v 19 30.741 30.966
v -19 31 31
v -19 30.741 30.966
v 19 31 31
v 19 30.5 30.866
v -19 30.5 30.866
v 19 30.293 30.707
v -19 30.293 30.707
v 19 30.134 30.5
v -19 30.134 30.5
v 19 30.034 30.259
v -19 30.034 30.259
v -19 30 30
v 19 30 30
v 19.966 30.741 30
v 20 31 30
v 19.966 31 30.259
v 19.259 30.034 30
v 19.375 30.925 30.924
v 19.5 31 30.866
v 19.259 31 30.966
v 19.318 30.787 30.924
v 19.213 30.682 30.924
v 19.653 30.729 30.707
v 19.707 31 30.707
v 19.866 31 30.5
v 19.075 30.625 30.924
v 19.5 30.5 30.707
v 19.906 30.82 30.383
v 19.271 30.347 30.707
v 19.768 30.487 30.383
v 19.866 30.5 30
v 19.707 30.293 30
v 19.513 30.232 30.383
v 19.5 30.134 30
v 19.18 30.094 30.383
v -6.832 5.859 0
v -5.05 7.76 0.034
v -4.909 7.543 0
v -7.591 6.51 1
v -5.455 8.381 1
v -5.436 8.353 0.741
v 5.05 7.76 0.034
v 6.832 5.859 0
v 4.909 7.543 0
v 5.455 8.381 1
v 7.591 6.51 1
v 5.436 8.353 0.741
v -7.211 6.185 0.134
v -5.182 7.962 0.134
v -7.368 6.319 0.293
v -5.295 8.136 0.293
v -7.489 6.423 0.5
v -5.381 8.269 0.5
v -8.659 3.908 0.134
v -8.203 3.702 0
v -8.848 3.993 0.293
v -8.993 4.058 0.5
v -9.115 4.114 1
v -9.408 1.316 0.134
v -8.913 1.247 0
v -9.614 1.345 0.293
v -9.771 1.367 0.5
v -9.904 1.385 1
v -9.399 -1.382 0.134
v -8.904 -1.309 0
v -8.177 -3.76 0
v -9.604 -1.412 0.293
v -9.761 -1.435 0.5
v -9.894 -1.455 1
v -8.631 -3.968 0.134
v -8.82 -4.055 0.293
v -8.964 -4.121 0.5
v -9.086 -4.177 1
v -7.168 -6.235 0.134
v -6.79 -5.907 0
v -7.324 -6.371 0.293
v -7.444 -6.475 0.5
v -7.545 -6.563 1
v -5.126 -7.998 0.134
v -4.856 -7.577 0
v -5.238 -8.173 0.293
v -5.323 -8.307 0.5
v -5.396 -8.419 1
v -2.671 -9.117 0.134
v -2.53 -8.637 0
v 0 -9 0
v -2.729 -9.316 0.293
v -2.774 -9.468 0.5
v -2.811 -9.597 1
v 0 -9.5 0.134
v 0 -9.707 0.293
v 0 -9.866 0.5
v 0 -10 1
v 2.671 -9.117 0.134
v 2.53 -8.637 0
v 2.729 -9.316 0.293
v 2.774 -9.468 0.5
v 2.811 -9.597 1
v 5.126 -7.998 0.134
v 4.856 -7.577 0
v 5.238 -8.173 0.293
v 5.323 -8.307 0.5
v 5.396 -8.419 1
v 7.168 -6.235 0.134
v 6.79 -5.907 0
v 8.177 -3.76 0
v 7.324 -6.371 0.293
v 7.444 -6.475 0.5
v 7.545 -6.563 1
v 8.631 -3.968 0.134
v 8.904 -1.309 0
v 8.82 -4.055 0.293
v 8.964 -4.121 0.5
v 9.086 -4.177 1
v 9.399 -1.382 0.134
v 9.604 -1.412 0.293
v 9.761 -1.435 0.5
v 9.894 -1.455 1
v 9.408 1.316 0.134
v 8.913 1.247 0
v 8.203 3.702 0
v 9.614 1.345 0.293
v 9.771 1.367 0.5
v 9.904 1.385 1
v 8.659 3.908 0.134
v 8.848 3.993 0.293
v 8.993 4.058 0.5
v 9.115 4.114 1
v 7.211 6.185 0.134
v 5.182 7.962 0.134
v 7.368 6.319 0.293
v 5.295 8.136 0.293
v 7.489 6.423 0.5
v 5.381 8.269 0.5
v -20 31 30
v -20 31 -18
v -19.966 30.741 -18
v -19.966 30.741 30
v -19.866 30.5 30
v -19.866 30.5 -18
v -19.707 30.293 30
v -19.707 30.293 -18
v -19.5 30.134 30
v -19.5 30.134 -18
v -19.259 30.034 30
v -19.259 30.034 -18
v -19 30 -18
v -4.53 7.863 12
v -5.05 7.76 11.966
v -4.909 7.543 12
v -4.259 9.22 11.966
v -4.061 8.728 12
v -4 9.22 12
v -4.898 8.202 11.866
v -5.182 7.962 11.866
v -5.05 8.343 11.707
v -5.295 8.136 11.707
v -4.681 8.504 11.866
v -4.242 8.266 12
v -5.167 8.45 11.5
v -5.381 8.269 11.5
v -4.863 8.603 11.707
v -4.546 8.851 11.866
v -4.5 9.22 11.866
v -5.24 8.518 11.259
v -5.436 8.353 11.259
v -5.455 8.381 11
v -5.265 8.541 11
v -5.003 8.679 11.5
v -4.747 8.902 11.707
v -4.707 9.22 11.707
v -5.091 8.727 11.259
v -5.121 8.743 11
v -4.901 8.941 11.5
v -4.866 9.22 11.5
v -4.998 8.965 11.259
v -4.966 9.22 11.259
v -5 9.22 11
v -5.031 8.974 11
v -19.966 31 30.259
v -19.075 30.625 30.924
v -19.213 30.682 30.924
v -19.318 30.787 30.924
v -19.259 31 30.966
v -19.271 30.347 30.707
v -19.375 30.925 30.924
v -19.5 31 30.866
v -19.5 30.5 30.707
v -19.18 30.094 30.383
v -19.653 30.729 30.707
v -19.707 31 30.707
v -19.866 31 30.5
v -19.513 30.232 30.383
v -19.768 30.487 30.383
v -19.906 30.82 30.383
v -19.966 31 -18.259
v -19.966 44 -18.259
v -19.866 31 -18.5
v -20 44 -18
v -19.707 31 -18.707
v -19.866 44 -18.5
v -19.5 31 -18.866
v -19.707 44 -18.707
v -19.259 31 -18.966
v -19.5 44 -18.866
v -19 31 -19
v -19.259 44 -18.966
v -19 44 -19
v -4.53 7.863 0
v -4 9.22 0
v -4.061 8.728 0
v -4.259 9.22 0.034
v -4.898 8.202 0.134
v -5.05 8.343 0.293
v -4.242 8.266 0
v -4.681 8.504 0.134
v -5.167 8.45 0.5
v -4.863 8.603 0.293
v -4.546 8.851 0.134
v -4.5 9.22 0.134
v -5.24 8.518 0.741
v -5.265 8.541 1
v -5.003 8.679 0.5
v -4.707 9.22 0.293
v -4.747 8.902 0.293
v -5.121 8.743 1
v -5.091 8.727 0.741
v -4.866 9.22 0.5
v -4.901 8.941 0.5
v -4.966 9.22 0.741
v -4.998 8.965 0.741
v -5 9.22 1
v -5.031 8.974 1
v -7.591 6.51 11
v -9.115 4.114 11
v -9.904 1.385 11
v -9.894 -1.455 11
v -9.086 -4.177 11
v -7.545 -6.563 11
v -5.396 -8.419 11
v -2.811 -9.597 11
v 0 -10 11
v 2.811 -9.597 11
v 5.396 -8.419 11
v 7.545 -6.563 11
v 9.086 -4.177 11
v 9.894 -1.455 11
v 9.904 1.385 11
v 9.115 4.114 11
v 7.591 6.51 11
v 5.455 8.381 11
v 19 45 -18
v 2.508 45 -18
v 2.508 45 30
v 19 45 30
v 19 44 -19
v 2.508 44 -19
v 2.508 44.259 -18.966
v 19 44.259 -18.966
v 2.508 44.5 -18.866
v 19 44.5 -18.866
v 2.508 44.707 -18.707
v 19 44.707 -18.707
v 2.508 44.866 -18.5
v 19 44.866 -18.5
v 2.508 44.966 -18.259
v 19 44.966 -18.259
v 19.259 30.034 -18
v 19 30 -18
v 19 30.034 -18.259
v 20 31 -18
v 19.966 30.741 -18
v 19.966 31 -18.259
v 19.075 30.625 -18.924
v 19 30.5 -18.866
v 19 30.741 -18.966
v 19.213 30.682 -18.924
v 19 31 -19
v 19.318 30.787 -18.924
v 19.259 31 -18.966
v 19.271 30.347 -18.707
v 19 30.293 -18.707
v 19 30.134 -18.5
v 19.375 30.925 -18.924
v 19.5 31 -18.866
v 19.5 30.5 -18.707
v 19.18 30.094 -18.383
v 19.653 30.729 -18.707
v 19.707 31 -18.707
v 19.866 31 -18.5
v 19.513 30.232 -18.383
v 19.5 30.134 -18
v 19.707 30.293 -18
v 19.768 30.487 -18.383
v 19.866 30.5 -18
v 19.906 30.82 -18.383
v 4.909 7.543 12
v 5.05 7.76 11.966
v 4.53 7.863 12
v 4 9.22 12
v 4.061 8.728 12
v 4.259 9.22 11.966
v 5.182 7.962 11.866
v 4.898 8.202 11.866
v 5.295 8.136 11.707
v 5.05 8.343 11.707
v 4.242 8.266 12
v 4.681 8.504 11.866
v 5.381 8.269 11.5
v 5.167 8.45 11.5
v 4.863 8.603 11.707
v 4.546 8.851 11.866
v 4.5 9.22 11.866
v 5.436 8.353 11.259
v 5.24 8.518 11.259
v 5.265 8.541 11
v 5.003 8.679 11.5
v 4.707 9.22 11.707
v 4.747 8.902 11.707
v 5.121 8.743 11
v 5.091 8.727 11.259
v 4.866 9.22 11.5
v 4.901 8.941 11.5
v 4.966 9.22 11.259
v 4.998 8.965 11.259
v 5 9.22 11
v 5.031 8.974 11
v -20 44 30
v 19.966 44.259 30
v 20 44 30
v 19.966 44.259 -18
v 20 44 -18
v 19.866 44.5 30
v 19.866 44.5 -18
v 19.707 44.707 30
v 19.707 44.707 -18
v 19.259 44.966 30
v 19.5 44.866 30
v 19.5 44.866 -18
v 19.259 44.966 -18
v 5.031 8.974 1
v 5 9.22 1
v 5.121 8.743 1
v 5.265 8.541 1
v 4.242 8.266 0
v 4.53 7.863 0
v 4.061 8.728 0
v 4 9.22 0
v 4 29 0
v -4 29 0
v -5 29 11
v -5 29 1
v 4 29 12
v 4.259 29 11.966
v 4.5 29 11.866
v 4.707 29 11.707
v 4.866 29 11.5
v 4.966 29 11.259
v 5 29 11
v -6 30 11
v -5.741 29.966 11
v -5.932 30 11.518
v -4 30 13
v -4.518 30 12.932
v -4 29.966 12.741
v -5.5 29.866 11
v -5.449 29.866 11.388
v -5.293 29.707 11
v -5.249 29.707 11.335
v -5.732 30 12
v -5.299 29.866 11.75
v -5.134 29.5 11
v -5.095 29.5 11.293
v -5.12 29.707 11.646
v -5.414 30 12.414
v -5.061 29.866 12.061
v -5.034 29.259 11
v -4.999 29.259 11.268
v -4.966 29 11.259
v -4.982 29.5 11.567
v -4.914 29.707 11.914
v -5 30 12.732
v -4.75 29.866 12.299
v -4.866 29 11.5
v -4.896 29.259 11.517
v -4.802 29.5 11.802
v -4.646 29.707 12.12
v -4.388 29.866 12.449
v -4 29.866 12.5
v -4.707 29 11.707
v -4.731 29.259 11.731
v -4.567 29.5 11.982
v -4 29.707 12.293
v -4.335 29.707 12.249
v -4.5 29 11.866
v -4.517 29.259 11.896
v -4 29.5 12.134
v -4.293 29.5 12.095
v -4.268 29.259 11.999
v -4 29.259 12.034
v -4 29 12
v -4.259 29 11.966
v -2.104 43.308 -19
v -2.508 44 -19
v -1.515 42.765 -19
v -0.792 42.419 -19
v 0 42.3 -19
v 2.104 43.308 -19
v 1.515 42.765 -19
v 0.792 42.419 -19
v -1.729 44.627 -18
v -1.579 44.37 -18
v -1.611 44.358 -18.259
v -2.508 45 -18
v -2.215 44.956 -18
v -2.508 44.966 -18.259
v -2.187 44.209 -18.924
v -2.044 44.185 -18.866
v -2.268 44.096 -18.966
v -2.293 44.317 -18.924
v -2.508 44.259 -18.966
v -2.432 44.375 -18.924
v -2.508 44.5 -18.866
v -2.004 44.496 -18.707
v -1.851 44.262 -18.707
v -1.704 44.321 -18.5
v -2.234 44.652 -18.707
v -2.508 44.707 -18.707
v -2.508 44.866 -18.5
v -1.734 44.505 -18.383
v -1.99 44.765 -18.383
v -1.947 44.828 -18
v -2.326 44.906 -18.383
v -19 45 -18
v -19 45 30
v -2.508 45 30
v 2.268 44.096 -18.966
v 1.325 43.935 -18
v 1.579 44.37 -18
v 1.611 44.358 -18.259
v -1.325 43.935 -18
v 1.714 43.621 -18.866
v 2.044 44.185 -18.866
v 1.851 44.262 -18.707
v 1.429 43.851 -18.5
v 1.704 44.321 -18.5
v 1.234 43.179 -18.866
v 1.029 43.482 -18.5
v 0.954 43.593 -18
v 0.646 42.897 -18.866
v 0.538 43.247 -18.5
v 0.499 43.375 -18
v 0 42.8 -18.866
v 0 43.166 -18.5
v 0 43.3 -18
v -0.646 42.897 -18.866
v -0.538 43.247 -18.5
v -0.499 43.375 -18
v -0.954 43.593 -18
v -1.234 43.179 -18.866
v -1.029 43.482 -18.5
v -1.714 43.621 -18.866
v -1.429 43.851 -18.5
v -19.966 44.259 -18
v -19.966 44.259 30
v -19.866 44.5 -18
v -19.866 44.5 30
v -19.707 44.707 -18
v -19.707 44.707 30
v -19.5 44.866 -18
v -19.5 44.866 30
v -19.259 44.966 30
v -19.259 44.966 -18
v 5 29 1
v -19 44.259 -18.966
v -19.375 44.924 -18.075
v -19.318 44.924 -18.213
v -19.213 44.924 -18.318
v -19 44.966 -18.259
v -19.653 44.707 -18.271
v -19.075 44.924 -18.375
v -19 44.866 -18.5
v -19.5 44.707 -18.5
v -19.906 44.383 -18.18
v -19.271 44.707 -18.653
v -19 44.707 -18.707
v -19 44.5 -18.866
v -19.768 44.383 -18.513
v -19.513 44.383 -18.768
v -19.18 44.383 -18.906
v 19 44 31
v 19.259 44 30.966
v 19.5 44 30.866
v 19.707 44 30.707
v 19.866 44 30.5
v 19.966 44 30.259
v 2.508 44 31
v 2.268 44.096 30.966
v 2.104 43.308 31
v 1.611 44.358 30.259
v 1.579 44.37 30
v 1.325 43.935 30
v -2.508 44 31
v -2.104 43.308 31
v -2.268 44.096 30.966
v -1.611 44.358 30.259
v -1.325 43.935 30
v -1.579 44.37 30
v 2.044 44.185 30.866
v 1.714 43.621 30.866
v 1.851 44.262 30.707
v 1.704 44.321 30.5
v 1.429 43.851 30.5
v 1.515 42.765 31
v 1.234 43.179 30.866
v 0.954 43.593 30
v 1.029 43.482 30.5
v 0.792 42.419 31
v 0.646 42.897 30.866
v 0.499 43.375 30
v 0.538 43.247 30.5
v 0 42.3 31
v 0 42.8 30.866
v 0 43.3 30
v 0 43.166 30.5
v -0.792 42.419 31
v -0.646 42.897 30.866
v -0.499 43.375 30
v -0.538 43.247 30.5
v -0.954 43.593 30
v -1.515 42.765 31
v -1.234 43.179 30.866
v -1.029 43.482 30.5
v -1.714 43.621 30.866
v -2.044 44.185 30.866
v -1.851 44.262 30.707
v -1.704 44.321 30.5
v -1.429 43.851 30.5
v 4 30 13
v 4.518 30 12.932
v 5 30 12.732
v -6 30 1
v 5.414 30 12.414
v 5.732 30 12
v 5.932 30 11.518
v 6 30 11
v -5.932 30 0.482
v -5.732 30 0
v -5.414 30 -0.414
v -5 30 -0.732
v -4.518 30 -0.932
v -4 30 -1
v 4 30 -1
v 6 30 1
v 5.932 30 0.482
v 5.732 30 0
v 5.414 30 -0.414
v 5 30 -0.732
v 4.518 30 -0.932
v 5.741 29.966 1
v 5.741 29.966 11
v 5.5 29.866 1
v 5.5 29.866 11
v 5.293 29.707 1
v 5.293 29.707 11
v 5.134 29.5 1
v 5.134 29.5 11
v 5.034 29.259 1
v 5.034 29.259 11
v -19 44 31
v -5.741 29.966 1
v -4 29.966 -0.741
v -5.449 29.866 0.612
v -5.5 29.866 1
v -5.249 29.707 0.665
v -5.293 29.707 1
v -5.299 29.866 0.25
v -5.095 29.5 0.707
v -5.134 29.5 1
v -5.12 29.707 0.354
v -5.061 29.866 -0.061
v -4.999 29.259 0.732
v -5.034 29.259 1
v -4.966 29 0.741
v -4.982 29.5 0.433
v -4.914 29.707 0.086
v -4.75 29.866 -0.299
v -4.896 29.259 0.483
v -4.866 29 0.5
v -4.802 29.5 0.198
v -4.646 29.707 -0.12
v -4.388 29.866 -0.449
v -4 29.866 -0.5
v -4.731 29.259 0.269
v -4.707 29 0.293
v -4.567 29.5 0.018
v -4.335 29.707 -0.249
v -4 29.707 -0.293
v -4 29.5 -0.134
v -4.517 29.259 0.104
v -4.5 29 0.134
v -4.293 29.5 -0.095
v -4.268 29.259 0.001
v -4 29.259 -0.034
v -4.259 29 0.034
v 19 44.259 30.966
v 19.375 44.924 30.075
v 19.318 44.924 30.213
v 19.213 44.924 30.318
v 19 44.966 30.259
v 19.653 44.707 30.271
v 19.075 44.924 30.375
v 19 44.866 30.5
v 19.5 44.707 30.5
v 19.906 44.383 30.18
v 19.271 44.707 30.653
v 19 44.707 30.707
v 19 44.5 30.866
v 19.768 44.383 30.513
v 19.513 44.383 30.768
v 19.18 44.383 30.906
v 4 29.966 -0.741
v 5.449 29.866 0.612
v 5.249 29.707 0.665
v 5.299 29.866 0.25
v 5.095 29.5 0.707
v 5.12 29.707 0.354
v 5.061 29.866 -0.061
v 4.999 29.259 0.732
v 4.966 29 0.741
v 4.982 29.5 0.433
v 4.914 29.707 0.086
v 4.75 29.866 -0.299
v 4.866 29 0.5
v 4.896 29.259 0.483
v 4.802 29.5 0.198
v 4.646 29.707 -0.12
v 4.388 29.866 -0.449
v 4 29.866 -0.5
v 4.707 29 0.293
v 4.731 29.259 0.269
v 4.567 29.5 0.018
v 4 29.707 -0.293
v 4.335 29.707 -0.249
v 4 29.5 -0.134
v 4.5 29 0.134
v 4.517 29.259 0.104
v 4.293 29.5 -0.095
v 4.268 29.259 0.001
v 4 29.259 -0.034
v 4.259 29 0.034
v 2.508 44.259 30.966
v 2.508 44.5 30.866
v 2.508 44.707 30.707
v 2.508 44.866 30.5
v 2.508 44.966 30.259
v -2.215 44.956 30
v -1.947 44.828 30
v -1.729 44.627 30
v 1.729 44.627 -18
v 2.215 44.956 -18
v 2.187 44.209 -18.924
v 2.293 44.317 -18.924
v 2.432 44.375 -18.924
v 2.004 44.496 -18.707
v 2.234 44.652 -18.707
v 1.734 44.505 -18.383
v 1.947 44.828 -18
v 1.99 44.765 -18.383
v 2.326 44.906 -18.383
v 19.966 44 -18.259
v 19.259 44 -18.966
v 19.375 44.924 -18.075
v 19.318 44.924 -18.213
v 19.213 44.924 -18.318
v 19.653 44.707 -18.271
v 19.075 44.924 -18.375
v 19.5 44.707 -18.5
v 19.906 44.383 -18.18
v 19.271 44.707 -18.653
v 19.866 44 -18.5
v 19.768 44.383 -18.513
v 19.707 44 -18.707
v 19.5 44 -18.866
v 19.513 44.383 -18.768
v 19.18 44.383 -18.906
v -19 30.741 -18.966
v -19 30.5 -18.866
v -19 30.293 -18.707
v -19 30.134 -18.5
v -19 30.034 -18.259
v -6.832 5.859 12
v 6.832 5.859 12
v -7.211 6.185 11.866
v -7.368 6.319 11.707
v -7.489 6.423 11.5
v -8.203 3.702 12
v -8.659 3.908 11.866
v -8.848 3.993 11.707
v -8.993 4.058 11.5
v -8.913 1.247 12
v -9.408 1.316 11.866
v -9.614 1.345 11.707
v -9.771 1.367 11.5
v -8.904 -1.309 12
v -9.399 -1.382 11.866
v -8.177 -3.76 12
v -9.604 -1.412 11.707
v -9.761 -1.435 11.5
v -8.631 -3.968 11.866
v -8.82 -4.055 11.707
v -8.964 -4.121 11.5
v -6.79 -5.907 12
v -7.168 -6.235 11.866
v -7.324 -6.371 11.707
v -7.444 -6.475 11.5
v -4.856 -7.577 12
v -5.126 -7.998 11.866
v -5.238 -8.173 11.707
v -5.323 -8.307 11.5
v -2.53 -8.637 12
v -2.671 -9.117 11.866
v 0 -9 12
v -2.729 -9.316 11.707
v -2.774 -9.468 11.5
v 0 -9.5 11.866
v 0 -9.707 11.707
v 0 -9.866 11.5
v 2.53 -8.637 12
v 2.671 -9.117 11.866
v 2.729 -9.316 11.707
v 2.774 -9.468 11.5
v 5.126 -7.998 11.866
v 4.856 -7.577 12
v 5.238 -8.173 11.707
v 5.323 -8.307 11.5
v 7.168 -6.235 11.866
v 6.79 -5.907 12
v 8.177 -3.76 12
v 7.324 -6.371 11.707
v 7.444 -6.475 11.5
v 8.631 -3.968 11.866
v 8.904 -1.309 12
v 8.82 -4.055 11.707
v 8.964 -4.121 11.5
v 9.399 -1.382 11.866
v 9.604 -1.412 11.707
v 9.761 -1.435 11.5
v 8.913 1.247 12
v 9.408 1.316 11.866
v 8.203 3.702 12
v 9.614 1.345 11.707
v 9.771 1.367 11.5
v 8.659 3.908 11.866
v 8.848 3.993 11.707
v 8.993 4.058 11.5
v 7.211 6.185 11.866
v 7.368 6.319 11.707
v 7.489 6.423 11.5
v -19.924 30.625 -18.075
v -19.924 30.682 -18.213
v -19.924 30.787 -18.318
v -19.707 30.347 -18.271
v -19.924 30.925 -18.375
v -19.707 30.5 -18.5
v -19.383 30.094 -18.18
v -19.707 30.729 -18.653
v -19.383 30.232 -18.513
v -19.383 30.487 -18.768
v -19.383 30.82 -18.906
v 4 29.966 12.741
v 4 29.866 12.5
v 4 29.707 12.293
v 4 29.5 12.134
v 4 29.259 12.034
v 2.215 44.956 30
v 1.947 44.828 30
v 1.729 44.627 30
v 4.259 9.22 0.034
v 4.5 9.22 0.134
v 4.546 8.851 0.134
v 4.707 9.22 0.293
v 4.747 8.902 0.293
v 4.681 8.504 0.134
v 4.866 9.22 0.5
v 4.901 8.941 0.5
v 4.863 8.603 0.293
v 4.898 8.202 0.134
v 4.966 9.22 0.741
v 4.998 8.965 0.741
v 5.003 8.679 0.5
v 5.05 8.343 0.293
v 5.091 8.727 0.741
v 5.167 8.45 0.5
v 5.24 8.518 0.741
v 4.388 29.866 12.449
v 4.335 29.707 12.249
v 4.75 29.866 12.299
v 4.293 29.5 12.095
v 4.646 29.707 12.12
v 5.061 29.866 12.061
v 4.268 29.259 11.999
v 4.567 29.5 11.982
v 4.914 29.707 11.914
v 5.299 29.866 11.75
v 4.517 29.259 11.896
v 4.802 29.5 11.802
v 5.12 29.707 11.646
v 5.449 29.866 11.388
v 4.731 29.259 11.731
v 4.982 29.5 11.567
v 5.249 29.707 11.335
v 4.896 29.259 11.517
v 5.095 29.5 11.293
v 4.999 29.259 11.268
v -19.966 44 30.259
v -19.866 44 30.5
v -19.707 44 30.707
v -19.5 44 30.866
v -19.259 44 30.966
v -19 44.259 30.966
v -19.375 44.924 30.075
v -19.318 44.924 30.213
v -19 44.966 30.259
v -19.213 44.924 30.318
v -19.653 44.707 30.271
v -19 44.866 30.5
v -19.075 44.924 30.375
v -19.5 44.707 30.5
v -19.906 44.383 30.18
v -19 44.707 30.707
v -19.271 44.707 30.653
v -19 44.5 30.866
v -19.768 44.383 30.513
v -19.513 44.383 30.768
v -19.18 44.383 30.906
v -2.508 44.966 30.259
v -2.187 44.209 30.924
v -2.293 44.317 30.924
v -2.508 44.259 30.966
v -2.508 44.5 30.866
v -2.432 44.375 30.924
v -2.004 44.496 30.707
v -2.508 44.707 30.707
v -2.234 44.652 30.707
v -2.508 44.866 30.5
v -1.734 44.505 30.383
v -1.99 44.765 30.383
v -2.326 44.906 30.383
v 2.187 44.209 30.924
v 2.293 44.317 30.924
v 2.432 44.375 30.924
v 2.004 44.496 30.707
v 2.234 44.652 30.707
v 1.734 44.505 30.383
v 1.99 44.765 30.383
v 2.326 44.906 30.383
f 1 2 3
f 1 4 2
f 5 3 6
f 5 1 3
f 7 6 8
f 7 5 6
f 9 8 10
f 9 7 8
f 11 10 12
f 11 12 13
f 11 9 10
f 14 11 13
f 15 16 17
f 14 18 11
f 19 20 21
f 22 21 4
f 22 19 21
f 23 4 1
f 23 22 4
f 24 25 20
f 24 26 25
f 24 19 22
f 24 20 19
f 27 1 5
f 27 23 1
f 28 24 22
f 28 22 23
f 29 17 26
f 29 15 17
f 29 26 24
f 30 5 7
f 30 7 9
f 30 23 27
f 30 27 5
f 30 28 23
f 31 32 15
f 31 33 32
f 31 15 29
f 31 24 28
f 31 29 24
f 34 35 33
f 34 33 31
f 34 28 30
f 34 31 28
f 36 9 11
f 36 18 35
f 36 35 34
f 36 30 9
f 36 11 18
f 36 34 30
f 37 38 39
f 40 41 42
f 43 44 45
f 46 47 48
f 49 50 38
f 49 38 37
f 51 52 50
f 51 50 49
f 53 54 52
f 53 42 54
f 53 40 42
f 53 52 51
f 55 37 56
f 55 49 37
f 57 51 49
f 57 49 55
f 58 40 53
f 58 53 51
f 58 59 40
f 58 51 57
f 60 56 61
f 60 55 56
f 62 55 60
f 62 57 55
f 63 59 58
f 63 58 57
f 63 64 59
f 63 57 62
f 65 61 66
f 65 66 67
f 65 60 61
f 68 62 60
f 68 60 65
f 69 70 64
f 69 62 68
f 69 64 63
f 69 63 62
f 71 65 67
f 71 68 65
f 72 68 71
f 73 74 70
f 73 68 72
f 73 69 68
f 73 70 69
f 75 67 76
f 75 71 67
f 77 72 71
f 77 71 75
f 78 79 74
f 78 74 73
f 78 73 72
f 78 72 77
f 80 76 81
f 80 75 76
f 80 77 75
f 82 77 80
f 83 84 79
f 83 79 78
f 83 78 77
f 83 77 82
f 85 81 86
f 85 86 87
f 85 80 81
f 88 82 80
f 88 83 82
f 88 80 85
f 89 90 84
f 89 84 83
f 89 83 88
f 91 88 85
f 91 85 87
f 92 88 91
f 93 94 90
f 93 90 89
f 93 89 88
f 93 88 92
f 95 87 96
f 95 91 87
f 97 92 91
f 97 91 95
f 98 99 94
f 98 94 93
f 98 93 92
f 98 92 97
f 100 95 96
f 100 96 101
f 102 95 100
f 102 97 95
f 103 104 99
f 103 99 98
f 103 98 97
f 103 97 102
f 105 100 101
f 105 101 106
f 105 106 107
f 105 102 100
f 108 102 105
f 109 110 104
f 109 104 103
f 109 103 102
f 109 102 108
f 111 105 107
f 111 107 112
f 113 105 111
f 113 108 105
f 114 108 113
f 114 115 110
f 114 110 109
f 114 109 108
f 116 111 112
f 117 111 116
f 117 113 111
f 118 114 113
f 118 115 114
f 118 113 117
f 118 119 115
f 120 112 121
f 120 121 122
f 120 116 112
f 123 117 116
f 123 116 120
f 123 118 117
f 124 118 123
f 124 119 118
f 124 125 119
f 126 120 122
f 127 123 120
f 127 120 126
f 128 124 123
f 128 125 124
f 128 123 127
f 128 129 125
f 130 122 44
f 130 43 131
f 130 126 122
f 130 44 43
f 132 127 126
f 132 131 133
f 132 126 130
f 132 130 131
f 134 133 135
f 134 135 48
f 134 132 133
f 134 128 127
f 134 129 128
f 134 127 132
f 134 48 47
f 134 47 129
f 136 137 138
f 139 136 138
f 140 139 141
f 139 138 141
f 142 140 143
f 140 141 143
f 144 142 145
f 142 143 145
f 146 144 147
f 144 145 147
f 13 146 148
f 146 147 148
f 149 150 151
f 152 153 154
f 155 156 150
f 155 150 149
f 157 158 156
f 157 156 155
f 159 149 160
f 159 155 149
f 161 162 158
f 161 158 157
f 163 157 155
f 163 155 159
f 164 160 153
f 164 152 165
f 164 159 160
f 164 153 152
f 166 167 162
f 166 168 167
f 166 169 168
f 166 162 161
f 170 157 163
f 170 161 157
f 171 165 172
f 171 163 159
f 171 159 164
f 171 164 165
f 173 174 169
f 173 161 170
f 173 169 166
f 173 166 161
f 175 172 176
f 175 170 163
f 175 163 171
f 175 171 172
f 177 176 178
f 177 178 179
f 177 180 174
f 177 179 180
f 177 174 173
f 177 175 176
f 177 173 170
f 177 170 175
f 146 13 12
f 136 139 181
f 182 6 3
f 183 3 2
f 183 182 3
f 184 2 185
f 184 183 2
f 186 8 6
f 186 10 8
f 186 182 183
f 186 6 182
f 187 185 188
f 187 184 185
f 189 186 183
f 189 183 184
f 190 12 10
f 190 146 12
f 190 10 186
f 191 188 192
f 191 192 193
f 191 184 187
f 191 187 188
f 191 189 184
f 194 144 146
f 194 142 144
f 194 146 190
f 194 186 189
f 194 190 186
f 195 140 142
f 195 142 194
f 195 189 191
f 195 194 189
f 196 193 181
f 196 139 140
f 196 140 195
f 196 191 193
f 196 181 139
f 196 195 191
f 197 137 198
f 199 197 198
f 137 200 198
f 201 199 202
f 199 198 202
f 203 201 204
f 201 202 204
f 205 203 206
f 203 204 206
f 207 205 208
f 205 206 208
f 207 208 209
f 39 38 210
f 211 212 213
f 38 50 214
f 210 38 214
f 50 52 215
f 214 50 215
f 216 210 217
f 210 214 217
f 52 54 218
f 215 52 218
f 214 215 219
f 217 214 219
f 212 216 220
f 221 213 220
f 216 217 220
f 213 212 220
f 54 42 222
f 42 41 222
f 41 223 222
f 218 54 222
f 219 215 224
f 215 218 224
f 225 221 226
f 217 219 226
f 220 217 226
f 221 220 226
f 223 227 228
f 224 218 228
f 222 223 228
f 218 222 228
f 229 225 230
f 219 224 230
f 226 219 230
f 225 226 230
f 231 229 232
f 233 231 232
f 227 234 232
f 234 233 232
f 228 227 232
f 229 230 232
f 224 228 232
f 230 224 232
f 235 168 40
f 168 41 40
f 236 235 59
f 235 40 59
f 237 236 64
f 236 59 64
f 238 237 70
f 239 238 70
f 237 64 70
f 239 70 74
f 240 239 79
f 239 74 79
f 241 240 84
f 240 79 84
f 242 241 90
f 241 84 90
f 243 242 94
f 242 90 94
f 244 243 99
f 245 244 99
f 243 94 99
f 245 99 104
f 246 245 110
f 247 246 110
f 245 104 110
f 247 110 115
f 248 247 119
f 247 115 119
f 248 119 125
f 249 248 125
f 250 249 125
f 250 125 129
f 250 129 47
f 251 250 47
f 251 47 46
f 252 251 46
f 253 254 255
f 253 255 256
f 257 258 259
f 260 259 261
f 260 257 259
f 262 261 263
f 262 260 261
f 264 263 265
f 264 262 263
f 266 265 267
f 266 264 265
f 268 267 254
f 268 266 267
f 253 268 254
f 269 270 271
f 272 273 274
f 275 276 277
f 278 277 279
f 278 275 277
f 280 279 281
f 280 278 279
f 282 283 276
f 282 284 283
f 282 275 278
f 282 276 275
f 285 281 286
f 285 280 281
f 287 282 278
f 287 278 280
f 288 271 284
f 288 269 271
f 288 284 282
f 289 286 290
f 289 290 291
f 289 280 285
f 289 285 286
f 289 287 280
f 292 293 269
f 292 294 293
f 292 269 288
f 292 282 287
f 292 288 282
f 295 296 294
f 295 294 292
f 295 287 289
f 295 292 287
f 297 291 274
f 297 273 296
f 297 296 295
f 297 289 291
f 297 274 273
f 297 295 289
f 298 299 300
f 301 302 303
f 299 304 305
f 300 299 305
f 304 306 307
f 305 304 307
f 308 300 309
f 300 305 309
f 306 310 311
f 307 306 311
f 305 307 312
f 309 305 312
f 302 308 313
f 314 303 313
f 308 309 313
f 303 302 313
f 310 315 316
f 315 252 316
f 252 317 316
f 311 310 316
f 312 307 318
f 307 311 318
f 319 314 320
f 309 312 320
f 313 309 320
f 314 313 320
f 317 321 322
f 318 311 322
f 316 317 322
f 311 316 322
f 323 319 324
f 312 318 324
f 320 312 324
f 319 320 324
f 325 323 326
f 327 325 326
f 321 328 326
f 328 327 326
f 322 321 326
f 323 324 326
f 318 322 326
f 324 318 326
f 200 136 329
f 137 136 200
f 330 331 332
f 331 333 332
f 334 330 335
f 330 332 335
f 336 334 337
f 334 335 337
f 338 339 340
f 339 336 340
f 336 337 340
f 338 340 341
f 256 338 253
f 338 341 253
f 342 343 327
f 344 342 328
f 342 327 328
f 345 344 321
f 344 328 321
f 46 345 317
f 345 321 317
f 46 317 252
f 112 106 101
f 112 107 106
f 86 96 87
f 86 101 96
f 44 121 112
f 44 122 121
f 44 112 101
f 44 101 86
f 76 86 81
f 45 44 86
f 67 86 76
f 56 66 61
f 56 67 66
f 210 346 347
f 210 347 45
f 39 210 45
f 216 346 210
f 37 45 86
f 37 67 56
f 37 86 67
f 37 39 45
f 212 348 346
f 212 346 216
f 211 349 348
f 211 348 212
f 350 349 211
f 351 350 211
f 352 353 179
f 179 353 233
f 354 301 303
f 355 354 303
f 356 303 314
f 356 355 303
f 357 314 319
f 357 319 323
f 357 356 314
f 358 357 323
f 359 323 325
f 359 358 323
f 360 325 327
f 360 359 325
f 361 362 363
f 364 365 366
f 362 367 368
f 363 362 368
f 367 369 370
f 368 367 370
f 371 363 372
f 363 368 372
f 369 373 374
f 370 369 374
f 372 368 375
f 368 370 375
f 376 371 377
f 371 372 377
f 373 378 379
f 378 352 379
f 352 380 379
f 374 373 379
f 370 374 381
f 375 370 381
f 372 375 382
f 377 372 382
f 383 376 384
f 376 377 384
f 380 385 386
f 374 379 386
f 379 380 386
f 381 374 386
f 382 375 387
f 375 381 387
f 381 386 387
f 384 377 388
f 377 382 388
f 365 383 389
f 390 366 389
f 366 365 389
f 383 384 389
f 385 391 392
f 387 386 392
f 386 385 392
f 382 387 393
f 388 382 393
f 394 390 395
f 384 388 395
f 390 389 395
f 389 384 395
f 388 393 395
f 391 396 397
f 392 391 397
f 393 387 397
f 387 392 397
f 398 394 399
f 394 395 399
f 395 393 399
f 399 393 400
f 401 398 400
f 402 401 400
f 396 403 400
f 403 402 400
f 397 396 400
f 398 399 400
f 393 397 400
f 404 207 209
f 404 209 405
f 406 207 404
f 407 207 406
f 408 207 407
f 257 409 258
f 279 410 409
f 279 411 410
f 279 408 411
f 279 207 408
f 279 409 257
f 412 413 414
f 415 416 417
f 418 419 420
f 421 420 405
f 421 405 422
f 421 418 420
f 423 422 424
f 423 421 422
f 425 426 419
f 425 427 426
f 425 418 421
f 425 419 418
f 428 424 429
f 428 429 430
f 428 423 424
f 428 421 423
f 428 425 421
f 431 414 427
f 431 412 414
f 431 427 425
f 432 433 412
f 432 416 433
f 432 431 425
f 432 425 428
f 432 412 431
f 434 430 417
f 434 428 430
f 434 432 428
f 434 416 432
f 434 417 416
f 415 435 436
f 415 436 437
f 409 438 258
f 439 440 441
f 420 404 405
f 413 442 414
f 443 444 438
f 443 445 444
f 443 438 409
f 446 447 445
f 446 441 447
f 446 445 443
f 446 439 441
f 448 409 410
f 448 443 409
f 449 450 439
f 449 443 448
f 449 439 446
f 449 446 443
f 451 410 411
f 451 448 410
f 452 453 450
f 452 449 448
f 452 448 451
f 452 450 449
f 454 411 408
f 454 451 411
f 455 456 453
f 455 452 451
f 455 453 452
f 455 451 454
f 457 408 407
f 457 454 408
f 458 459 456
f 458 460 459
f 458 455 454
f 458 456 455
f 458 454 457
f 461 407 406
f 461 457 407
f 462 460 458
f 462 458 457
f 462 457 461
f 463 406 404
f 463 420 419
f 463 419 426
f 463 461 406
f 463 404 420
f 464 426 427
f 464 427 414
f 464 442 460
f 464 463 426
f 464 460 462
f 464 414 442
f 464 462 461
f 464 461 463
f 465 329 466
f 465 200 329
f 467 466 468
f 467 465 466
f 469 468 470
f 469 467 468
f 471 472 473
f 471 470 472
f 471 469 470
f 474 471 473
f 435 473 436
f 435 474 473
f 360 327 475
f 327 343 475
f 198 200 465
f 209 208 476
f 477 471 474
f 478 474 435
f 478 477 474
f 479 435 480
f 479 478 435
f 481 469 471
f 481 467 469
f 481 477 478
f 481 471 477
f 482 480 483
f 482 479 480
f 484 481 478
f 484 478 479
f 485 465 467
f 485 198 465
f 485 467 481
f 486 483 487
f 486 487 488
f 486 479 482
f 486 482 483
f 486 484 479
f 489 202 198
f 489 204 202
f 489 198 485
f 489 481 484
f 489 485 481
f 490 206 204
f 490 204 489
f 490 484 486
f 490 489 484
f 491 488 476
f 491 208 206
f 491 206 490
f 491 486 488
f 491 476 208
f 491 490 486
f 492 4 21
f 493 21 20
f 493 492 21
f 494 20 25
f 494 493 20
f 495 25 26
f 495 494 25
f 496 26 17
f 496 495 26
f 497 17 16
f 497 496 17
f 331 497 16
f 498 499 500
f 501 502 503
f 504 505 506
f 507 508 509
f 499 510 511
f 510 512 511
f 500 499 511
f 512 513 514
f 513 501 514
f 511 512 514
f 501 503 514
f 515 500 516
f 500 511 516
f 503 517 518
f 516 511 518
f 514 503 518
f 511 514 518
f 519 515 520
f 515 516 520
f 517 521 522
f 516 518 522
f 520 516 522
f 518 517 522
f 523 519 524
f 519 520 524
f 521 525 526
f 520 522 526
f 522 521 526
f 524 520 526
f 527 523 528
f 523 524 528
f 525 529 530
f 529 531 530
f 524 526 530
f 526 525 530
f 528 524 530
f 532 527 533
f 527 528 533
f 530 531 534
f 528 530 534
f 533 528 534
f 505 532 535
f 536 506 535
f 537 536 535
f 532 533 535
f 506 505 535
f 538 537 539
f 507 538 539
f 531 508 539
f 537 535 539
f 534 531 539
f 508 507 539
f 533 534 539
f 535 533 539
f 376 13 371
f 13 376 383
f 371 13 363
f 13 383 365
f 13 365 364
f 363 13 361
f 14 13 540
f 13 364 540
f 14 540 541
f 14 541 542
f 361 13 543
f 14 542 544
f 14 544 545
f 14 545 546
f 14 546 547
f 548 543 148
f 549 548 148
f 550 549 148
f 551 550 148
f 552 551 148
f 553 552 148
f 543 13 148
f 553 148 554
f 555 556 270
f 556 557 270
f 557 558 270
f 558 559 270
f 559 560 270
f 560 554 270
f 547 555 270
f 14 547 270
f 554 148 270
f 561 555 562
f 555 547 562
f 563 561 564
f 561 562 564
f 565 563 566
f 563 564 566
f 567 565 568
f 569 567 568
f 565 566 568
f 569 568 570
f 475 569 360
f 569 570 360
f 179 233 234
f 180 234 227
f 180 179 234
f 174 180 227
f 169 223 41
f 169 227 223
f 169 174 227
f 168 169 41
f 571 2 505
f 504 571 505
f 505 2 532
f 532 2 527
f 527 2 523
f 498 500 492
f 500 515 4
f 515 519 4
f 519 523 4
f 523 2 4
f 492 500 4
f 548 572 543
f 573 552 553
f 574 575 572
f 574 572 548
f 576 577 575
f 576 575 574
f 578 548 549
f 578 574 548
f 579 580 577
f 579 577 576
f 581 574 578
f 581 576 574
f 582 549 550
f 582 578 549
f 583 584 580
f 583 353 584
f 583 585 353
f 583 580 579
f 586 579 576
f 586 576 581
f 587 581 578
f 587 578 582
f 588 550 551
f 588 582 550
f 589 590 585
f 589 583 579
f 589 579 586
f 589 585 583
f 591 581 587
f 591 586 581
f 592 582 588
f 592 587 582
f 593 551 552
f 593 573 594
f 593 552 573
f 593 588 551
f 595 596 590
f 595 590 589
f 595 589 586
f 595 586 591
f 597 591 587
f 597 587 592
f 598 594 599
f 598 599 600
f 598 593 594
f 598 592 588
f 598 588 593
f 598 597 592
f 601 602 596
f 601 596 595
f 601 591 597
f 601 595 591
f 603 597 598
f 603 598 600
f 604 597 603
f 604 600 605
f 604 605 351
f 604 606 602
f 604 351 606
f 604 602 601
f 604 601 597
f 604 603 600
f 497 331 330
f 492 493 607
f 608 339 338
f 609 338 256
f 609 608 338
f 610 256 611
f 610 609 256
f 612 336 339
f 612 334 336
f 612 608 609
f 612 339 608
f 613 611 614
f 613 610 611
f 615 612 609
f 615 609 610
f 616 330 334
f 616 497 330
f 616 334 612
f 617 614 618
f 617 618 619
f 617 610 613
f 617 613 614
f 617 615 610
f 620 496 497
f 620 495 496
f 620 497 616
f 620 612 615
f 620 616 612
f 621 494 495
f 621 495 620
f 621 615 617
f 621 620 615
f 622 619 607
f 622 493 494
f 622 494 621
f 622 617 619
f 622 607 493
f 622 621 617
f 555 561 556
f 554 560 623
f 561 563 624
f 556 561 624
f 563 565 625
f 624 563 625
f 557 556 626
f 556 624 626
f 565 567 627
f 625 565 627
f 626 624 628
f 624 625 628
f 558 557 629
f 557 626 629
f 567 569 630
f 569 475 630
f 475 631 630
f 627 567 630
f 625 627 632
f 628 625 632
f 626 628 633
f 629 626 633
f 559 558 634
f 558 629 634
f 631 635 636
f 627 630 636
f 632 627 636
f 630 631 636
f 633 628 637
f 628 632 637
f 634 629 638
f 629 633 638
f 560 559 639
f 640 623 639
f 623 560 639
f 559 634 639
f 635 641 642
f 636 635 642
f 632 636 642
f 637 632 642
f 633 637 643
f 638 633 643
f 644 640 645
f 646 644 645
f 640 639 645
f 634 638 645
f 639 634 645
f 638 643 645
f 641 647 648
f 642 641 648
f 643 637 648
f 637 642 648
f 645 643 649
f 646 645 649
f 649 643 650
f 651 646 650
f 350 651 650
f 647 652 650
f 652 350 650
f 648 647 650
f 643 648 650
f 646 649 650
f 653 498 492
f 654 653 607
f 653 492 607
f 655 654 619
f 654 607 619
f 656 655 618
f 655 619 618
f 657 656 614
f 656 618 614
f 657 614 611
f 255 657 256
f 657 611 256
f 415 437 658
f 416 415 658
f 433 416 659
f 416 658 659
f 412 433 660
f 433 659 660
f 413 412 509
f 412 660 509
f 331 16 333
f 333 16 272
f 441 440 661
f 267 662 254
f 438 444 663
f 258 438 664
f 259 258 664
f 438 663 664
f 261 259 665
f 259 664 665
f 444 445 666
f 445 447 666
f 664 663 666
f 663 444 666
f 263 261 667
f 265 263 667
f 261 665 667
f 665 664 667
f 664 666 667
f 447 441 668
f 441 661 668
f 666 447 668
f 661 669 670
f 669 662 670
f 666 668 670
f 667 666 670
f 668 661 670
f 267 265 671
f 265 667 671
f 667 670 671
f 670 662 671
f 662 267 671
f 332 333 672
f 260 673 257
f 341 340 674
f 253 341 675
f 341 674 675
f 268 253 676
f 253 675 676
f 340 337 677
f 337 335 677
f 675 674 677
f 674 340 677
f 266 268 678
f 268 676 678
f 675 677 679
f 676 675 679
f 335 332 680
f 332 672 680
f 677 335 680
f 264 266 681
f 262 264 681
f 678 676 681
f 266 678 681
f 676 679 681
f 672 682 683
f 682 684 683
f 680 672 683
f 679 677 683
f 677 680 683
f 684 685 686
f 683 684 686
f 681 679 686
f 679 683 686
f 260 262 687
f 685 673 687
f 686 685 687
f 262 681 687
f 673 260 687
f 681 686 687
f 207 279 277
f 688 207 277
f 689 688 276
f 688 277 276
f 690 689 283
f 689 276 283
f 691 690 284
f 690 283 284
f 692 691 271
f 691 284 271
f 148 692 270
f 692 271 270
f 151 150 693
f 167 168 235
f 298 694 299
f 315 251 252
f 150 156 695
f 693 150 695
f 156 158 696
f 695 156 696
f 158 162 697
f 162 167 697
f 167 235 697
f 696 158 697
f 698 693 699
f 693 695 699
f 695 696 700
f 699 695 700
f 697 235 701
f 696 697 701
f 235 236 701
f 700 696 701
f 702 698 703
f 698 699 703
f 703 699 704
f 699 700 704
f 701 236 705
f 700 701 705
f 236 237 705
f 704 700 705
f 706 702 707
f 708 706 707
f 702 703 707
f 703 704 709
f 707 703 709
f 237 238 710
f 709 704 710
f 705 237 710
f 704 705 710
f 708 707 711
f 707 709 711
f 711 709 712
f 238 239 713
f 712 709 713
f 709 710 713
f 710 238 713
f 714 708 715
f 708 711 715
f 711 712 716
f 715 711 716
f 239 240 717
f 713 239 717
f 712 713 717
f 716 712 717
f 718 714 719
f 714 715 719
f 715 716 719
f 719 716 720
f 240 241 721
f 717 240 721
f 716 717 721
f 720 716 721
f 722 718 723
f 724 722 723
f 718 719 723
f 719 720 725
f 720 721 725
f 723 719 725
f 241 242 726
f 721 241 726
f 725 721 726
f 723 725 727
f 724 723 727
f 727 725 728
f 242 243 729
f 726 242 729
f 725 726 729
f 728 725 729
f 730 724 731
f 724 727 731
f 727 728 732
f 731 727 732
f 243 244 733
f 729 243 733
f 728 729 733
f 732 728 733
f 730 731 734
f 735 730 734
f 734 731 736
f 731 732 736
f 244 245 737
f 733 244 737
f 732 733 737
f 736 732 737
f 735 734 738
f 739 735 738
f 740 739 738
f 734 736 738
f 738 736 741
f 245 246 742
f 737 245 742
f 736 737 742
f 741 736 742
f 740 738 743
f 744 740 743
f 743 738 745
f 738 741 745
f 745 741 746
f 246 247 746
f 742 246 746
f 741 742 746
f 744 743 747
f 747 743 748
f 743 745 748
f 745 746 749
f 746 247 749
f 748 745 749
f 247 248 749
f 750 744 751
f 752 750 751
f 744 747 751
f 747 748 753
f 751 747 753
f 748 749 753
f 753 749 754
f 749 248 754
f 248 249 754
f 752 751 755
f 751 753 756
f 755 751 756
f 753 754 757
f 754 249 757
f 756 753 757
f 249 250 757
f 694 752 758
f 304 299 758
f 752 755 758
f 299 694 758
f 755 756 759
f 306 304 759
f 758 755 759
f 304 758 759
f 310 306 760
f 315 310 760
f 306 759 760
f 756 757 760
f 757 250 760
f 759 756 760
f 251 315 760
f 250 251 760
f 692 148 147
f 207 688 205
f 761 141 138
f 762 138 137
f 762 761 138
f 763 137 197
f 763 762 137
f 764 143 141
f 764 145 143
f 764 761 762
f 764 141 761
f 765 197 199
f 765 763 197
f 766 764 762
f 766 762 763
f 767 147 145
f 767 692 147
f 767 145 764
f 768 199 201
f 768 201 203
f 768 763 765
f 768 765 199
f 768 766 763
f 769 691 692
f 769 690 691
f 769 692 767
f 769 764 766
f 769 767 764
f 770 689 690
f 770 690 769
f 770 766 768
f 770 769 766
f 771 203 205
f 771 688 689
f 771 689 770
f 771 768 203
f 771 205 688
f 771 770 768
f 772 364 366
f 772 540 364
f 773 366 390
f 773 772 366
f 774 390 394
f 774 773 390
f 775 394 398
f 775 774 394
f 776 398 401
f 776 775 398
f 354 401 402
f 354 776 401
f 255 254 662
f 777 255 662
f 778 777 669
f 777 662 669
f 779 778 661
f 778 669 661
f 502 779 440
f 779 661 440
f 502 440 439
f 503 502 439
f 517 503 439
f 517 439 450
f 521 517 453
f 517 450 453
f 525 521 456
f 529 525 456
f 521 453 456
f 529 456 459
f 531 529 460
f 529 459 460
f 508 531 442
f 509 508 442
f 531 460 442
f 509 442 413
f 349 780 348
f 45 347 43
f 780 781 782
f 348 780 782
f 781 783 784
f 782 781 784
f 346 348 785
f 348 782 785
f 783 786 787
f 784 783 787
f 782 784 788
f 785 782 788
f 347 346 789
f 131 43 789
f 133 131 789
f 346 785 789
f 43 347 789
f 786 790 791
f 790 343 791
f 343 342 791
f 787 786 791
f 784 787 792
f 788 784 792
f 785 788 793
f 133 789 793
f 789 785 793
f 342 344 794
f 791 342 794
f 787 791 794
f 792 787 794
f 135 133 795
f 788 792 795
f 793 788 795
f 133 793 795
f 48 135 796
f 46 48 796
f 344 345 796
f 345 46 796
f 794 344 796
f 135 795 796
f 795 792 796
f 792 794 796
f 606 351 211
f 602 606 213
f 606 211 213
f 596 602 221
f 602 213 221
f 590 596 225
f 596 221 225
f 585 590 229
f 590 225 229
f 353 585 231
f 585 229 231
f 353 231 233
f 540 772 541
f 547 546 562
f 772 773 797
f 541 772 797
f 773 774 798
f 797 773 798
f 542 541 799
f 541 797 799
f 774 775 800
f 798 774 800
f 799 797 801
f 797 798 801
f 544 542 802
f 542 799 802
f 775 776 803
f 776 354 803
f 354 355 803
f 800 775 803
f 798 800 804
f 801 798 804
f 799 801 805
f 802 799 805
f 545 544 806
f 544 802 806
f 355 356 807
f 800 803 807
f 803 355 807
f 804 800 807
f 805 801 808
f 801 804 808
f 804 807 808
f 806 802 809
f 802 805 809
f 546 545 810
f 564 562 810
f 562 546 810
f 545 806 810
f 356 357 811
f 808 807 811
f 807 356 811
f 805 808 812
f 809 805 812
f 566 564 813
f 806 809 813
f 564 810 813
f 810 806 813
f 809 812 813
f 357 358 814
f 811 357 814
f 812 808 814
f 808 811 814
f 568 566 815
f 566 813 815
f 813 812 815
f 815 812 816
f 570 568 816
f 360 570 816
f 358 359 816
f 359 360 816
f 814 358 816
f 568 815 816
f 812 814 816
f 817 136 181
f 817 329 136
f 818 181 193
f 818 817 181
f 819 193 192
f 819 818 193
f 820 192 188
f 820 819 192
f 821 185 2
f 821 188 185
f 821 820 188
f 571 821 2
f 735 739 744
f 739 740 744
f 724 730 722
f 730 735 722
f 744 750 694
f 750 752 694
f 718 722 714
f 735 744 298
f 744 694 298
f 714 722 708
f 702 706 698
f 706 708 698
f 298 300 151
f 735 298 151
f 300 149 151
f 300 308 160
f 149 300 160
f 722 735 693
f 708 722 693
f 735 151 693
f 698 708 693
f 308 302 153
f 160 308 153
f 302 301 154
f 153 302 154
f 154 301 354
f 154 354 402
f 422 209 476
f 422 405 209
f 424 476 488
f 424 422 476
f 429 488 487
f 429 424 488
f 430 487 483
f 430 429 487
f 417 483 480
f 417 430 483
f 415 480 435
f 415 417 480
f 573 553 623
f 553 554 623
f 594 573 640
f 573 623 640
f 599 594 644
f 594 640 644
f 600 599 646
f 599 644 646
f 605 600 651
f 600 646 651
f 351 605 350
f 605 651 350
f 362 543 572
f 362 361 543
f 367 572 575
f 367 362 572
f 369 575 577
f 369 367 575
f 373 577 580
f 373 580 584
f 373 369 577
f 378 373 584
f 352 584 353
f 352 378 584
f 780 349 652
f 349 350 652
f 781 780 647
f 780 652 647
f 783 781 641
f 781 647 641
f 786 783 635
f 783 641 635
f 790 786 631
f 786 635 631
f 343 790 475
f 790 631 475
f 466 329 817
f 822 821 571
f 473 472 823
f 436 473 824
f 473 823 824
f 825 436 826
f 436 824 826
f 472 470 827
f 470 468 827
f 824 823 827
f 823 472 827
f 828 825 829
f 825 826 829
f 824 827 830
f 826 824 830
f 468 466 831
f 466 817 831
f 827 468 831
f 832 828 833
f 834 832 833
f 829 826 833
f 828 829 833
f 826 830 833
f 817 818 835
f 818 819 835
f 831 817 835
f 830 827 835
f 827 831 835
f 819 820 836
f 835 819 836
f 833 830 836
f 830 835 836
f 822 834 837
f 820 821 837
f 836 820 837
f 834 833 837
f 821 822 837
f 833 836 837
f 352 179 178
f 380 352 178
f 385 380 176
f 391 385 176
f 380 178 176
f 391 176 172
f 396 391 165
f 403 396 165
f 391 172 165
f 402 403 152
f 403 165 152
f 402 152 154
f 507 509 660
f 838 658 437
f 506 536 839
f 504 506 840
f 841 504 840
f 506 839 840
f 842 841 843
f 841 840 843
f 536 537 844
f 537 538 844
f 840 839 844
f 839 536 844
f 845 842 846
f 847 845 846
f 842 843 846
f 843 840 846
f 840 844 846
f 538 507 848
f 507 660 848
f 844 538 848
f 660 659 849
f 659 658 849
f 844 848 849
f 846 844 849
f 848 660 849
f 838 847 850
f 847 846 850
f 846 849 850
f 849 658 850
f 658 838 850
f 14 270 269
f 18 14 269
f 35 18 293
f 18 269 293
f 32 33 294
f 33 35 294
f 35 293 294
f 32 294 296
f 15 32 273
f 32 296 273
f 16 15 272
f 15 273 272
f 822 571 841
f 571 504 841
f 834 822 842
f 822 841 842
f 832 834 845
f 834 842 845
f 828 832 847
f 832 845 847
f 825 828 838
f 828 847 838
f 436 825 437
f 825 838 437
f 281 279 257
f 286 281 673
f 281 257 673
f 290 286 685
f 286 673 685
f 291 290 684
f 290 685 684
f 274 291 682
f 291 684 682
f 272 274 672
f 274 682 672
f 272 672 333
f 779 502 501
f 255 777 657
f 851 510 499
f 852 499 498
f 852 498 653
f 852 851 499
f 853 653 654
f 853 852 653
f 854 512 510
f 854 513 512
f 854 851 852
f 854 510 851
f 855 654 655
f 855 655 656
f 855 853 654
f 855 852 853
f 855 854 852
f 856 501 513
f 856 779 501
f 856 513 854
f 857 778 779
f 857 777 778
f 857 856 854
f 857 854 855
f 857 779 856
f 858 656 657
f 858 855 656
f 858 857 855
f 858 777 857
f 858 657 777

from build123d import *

# Parameters (mm, degrees)
EXTRUDE_1_DEPTH     = 12
SKETCH_2_W          = 40
SKETCH_2_H          = 50
EXTRUDE_2_DEPTH     = 15
SKETCH_3_R          = 1.7
CUT_EXTRUDE_2_DEPTH = 53
FILLET_1_R          = 1


with BuildPart() as part:
    # 草图1 → 凸台-拉伸1 (new body)
    with BuildSketch(Plane.XY):
        Polygon((5, 30), (5, 10), (5, 0), (0, 0), (-5, 0), (-5, 10), (-5, 30), align=None)
        with BuildLine():
            Line((-5, 0), (-5, 8.660254038))
            ThreePointArc((-5, 8.660254038), (0, -10), (5, 8.660254038))
            Line((5, 8.660254038), (5, 0))
            Line((5, 0), (0, 0))
            Line((0, 0), (-5, 0))
        make_face()
    extrude(amount=EXTRUDE_1_DEPTH)

    # 草图2 → 凸台-拉伸2 (add)
    with BuildSketch(Plane(origin=(0, 30, 0), x_dir=(1, 0, 0), z_dir=(0, 1, 0))):
        with Locations((0, -6)):
            Rectangle(SKETCH_2_W, SKETCH_2_H)
    extrude(amount=EXTRUDE_2_DEPTH)

    # 草图3 → 切除-拉伸2 (cut)
    with BuildSketch(Plane(origin=(0, 0, -19), x_dir=(-1, 0, 0), z_dir=(0, 0, -1))):
        with Locations((0, 45)):
            Circle(SKETCH_3_R)
    extrude(amount=-CUT_EXTRUDE_2_DEPTH, mode=Mode.SUBTRACT)

    # 圆角1
    fillet_1_edges = [part.edges().sort_by_distance(p)[0] for p in [
        (0, -10, 12),
        (5, 19.330127019, 12),
        (20, 30, 6),
        (20, 37.5, 31),
        (0, 30, -19),
        (20, 37.5, -19),
        (-20, 30, 6),
        (-20, 37.5, -19),
        (0, 30, 31),
        (-20, 37.5, 31),
        (20, 45, 6),
        (10.85, 45, -19),
        (-20, 45, 6),
        (-10.85, 45, 31),
        (0, 30, 12),
        (-10.85, 45, -19),
        (10.85, 45, 31),
        (-1.7, 45, 6),
        (1.7, 45, 6),
        (0, 43.3, 31),
        (0, 43.3, -19),
        (-5, 19.330127019, 12),
        (0, 30, 0),
        (5, 19.330127019, 0),
        (0, -10, 0),
        (-5, 19.330127019, 0),
        (-5, 30, 6),
        (5, 30, 6),
        (5, 8.660254038, 6),
        (-5, 8.660254038, 6),
    ]]
    fillet(fillet_1_edges, radius=FILLET_1_R)


solid = part.part
